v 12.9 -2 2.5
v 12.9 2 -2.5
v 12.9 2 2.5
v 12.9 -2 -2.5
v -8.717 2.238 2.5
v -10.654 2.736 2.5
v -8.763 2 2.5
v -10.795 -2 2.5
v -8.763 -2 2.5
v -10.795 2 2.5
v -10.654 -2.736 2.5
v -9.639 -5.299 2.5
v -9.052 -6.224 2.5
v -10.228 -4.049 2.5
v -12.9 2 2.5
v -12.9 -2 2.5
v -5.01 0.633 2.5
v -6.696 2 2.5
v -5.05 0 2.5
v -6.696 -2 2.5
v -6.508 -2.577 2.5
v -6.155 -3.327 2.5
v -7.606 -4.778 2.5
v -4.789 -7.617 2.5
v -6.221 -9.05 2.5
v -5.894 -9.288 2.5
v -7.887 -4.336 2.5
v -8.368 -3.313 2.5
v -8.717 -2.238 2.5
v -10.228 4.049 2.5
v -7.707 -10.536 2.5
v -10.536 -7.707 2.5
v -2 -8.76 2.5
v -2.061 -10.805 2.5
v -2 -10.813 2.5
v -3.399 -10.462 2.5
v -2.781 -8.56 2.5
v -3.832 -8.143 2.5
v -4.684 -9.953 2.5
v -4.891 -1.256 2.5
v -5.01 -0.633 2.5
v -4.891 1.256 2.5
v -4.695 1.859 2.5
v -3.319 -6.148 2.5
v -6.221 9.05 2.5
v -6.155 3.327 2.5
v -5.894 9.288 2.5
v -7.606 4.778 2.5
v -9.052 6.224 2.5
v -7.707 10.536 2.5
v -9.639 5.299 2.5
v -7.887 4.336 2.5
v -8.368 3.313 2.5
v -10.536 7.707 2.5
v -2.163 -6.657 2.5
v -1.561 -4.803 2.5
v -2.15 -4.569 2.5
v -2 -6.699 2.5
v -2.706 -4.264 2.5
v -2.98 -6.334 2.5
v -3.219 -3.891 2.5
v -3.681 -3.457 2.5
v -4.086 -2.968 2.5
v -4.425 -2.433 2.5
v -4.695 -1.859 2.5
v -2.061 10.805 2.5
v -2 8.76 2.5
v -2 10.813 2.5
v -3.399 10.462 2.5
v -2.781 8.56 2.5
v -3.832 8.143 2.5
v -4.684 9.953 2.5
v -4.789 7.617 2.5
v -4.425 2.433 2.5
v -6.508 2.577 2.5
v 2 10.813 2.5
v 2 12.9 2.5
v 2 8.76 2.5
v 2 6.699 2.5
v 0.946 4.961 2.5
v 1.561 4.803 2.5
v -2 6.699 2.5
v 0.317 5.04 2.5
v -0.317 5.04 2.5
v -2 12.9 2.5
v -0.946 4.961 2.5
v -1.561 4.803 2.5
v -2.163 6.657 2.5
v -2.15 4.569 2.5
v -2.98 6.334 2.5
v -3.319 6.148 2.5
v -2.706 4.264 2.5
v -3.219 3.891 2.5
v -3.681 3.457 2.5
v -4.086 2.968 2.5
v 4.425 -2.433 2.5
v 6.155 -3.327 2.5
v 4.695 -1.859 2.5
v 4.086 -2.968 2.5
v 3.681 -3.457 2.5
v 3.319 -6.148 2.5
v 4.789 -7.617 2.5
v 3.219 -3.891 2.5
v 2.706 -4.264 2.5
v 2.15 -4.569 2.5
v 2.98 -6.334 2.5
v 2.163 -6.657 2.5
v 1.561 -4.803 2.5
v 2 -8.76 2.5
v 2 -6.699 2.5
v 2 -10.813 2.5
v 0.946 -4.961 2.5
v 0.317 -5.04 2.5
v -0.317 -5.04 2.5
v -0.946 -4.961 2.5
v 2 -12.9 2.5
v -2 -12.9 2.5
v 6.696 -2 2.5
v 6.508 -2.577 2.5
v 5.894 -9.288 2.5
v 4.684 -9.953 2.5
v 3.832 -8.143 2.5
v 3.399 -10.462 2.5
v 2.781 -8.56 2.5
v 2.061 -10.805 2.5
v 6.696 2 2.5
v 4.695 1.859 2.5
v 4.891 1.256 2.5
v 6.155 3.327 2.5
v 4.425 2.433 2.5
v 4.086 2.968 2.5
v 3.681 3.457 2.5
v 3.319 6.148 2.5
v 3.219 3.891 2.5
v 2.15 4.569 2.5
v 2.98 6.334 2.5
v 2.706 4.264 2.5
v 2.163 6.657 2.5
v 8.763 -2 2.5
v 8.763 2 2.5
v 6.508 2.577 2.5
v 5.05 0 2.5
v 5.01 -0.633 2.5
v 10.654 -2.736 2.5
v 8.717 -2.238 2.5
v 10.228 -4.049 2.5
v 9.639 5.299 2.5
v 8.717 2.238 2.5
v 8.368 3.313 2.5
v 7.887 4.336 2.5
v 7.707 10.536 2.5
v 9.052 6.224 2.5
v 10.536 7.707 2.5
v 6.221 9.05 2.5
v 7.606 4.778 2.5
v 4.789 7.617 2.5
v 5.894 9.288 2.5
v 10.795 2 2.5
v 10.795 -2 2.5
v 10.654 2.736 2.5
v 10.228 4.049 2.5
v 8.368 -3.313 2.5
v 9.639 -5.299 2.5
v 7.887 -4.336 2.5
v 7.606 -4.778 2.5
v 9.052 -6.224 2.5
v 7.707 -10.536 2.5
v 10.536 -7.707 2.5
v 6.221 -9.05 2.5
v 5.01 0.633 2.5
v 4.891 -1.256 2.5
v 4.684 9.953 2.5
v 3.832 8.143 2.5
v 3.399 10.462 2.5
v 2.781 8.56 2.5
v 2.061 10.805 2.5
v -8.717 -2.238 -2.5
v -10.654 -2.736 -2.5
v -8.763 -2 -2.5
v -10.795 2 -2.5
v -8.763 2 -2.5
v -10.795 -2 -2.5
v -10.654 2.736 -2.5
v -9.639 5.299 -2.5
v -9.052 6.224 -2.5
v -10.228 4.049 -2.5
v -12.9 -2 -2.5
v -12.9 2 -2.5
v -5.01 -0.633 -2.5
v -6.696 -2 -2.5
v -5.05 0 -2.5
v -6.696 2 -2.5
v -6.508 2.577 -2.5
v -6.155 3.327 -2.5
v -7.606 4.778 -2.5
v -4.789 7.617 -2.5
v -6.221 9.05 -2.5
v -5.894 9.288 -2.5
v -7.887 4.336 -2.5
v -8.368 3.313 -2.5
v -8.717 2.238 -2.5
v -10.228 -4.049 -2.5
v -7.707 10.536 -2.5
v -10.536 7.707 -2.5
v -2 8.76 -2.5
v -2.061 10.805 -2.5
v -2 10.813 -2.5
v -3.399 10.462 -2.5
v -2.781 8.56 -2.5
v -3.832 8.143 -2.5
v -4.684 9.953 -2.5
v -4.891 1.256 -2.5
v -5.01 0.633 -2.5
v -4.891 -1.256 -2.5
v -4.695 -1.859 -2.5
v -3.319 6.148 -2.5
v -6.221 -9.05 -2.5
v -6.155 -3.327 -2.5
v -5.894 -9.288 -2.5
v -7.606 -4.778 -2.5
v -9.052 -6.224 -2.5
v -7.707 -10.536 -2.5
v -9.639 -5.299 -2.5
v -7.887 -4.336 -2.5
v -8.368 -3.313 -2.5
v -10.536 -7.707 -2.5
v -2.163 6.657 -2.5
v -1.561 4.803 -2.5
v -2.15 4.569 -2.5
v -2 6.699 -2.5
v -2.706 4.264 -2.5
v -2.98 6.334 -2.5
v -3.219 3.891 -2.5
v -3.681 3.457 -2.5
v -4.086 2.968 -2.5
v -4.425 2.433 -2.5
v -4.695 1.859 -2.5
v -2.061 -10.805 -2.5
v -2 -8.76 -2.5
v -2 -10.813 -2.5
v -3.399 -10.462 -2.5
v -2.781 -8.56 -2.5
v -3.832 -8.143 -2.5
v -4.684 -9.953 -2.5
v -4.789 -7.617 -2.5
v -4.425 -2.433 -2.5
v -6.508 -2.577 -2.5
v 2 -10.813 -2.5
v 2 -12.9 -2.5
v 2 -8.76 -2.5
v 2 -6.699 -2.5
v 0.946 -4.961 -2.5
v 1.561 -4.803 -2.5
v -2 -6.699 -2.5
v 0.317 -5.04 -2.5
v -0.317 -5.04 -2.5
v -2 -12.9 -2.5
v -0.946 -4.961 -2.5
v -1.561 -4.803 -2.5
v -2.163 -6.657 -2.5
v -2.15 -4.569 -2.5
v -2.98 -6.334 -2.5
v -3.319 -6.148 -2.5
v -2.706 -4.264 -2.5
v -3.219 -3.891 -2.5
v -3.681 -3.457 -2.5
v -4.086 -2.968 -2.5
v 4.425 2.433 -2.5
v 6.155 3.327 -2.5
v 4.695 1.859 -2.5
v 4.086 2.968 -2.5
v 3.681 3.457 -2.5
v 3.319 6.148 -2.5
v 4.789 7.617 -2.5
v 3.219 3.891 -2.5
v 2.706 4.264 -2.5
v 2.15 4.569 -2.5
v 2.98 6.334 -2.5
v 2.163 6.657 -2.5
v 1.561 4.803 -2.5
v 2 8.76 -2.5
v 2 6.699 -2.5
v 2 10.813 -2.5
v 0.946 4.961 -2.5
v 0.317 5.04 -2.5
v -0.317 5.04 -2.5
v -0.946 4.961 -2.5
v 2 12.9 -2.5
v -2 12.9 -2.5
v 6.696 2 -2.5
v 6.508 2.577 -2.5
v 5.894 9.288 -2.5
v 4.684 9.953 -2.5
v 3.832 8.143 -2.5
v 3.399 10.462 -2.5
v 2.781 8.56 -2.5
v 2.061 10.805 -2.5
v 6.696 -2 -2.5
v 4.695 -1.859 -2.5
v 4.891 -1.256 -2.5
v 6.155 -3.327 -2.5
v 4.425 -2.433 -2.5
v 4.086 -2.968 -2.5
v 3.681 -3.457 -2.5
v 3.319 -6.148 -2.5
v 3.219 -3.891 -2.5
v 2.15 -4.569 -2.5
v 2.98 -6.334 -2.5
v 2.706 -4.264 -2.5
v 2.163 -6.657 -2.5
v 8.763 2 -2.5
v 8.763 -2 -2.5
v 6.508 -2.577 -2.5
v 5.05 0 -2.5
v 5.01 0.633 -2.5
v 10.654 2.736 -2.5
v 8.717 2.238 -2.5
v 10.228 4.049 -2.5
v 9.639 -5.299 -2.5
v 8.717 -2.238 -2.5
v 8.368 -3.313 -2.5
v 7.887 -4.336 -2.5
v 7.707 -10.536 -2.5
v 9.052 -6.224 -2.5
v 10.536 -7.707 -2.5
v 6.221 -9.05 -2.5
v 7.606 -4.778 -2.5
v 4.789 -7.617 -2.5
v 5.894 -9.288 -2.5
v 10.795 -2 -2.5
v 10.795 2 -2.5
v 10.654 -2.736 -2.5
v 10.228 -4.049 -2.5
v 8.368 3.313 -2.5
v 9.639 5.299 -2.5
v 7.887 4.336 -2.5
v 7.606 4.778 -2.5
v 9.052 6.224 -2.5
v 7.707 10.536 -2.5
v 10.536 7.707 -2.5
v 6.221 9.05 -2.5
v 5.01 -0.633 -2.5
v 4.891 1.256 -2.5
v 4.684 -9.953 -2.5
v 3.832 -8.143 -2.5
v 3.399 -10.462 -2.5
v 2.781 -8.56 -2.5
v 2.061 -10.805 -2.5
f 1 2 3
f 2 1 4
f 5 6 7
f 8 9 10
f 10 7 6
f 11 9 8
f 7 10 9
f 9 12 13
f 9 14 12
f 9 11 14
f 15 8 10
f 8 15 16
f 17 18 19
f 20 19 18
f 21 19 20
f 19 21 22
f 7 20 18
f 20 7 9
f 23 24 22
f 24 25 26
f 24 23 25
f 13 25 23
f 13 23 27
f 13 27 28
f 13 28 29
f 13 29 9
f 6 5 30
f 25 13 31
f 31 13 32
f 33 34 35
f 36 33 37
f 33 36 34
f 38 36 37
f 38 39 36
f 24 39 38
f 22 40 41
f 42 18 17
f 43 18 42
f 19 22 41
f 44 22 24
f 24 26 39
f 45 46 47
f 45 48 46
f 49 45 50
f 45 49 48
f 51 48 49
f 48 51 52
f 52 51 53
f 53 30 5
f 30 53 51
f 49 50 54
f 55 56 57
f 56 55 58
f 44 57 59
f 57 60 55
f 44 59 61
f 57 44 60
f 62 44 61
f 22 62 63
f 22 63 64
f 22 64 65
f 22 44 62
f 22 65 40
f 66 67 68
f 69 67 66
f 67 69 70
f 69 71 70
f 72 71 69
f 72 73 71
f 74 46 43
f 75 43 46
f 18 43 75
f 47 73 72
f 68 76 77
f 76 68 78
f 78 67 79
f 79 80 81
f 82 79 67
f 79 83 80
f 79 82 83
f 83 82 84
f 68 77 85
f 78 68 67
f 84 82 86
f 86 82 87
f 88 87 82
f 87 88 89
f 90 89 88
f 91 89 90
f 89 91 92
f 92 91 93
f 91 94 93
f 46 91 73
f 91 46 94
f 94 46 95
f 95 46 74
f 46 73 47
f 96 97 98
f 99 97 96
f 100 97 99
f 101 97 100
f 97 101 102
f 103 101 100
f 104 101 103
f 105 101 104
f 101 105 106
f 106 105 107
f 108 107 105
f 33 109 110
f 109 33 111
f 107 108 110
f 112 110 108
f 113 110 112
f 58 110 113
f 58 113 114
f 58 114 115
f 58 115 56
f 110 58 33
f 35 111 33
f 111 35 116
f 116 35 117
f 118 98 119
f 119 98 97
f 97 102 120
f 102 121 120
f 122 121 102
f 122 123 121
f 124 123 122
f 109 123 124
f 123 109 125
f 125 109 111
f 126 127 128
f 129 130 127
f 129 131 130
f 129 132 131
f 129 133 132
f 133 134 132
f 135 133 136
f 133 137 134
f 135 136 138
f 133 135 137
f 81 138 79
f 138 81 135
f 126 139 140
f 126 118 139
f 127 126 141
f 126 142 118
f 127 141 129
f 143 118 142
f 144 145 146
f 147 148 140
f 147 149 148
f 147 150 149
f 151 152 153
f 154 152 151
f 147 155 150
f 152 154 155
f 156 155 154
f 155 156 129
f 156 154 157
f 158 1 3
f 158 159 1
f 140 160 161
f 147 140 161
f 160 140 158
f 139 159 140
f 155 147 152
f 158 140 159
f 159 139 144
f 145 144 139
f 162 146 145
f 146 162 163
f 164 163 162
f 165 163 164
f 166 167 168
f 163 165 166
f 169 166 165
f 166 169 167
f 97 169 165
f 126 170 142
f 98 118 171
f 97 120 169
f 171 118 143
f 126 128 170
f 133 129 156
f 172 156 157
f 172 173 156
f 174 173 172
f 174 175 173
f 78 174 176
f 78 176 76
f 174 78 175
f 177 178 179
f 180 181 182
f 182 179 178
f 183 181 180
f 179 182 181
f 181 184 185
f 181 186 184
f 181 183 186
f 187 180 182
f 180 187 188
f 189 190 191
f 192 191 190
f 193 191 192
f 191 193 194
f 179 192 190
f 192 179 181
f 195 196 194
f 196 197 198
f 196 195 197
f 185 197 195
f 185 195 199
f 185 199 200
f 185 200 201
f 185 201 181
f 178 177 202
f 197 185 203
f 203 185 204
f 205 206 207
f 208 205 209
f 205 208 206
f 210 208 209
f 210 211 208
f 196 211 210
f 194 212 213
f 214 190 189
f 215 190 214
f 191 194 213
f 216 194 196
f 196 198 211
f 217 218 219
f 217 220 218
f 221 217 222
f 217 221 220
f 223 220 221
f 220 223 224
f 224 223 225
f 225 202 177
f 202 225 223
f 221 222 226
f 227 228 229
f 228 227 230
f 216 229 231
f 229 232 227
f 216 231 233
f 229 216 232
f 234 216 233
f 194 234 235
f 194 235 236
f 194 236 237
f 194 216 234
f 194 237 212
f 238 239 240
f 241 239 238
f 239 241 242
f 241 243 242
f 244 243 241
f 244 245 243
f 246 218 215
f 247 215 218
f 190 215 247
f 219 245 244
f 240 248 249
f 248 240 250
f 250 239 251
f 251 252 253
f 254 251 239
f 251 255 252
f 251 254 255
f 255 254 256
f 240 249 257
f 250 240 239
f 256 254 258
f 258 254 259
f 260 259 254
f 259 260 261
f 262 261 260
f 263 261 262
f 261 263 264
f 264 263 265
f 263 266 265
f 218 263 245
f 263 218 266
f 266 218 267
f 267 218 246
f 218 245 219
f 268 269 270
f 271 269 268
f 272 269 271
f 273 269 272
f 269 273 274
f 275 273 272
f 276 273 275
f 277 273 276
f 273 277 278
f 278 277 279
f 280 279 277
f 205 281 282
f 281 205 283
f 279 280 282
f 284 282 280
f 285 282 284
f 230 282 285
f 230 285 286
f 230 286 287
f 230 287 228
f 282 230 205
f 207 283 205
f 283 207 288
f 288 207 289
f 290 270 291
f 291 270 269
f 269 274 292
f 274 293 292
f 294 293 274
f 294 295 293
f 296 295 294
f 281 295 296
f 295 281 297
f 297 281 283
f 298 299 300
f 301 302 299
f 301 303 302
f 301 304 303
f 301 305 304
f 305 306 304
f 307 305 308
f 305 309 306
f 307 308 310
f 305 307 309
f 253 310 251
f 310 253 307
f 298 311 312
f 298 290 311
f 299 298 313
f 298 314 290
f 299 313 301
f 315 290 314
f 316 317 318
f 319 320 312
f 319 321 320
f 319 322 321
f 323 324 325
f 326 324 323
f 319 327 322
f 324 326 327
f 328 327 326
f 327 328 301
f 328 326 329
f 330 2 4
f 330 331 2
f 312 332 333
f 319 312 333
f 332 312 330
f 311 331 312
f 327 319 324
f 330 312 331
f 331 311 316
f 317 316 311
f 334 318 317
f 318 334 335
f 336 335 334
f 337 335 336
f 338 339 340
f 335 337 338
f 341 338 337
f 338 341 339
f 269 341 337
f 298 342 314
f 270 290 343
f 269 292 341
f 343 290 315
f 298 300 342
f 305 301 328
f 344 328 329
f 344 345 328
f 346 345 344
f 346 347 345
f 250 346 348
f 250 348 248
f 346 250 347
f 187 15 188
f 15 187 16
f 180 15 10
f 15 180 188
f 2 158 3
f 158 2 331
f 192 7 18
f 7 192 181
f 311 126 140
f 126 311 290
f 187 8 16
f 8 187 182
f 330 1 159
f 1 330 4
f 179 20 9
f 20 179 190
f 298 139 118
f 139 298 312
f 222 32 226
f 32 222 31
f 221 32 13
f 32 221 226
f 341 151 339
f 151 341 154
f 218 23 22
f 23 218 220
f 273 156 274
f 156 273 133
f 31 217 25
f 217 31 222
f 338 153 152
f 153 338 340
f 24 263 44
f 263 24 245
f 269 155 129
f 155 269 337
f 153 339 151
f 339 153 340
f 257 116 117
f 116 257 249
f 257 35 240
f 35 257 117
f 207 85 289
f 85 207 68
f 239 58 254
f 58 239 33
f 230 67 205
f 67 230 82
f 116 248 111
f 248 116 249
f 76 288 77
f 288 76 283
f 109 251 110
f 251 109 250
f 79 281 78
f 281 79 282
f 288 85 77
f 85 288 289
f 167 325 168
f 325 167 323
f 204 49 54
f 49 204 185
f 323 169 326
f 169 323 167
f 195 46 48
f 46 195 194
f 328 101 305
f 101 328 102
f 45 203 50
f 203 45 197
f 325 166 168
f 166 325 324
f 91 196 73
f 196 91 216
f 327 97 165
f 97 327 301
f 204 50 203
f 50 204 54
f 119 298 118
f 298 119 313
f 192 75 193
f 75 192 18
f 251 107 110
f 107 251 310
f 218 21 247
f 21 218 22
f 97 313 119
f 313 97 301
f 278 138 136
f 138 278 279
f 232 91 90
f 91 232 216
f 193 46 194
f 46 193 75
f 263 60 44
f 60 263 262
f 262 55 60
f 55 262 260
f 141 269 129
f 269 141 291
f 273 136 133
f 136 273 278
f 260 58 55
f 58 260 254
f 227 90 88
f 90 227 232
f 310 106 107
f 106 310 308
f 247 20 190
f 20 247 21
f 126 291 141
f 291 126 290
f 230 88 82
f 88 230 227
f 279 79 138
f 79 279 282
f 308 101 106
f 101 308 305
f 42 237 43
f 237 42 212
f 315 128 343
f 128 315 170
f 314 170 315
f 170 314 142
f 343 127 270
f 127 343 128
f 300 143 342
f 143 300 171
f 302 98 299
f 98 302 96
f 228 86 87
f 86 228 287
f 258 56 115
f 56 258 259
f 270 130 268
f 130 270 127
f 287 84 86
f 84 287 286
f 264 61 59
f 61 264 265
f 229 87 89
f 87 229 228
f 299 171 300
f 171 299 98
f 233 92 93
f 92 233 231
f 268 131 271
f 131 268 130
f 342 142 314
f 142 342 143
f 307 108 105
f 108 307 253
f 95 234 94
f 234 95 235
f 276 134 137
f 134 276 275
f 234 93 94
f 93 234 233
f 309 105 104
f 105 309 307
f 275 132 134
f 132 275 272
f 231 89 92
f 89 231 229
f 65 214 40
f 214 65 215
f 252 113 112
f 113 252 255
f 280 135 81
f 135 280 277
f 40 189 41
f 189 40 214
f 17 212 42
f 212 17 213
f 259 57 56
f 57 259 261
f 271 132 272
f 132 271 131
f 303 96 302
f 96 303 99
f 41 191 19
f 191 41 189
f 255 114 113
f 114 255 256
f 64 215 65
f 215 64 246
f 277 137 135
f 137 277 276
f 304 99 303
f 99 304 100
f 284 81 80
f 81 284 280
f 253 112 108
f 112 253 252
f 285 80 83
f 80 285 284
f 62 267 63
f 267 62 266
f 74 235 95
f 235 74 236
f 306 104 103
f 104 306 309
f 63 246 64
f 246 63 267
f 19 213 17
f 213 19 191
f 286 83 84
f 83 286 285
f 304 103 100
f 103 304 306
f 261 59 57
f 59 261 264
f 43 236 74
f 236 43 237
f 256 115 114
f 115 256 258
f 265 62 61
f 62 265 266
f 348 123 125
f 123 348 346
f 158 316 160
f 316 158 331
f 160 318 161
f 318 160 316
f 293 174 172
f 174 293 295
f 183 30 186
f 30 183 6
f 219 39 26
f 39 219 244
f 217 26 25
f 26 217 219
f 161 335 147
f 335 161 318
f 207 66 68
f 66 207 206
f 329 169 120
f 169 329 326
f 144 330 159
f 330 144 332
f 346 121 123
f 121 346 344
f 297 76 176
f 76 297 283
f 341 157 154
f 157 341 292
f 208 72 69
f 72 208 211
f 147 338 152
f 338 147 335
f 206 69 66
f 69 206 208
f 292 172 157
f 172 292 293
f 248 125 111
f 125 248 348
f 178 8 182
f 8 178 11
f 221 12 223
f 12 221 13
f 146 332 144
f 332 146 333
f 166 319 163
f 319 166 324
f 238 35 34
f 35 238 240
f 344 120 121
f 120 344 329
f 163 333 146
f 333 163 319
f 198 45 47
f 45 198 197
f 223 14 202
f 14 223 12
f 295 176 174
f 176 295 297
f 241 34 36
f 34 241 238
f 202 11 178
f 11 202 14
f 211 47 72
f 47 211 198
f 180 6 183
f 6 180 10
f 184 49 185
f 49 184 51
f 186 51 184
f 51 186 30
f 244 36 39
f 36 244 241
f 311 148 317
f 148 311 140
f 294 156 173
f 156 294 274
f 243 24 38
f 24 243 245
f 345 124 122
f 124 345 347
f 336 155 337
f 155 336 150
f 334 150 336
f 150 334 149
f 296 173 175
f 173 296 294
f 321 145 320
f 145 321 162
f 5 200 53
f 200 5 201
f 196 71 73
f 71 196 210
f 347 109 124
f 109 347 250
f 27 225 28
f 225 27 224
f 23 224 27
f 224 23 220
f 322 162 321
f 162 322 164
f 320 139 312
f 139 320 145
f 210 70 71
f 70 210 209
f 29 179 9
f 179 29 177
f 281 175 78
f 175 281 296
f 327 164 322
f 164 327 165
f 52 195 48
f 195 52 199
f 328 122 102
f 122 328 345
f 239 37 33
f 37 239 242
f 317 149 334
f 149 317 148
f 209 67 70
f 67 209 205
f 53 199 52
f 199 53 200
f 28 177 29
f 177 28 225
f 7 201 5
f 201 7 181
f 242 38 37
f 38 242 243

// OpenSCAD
$fn=50;

difference(){
    union(){
        for(i=[0:7]){
            rotate([0, 0, i * 45]) cube([25.8, 4, 5], center = true);
        }
        cylinder(d=14, h=5, center=true);
    }
    cylinder(d=10.1, h=7, center=true);
}

difference(){
    cylinder(d=22, h=5, center=true);  
cylinder(d=18, h=7, center=true);    
}
